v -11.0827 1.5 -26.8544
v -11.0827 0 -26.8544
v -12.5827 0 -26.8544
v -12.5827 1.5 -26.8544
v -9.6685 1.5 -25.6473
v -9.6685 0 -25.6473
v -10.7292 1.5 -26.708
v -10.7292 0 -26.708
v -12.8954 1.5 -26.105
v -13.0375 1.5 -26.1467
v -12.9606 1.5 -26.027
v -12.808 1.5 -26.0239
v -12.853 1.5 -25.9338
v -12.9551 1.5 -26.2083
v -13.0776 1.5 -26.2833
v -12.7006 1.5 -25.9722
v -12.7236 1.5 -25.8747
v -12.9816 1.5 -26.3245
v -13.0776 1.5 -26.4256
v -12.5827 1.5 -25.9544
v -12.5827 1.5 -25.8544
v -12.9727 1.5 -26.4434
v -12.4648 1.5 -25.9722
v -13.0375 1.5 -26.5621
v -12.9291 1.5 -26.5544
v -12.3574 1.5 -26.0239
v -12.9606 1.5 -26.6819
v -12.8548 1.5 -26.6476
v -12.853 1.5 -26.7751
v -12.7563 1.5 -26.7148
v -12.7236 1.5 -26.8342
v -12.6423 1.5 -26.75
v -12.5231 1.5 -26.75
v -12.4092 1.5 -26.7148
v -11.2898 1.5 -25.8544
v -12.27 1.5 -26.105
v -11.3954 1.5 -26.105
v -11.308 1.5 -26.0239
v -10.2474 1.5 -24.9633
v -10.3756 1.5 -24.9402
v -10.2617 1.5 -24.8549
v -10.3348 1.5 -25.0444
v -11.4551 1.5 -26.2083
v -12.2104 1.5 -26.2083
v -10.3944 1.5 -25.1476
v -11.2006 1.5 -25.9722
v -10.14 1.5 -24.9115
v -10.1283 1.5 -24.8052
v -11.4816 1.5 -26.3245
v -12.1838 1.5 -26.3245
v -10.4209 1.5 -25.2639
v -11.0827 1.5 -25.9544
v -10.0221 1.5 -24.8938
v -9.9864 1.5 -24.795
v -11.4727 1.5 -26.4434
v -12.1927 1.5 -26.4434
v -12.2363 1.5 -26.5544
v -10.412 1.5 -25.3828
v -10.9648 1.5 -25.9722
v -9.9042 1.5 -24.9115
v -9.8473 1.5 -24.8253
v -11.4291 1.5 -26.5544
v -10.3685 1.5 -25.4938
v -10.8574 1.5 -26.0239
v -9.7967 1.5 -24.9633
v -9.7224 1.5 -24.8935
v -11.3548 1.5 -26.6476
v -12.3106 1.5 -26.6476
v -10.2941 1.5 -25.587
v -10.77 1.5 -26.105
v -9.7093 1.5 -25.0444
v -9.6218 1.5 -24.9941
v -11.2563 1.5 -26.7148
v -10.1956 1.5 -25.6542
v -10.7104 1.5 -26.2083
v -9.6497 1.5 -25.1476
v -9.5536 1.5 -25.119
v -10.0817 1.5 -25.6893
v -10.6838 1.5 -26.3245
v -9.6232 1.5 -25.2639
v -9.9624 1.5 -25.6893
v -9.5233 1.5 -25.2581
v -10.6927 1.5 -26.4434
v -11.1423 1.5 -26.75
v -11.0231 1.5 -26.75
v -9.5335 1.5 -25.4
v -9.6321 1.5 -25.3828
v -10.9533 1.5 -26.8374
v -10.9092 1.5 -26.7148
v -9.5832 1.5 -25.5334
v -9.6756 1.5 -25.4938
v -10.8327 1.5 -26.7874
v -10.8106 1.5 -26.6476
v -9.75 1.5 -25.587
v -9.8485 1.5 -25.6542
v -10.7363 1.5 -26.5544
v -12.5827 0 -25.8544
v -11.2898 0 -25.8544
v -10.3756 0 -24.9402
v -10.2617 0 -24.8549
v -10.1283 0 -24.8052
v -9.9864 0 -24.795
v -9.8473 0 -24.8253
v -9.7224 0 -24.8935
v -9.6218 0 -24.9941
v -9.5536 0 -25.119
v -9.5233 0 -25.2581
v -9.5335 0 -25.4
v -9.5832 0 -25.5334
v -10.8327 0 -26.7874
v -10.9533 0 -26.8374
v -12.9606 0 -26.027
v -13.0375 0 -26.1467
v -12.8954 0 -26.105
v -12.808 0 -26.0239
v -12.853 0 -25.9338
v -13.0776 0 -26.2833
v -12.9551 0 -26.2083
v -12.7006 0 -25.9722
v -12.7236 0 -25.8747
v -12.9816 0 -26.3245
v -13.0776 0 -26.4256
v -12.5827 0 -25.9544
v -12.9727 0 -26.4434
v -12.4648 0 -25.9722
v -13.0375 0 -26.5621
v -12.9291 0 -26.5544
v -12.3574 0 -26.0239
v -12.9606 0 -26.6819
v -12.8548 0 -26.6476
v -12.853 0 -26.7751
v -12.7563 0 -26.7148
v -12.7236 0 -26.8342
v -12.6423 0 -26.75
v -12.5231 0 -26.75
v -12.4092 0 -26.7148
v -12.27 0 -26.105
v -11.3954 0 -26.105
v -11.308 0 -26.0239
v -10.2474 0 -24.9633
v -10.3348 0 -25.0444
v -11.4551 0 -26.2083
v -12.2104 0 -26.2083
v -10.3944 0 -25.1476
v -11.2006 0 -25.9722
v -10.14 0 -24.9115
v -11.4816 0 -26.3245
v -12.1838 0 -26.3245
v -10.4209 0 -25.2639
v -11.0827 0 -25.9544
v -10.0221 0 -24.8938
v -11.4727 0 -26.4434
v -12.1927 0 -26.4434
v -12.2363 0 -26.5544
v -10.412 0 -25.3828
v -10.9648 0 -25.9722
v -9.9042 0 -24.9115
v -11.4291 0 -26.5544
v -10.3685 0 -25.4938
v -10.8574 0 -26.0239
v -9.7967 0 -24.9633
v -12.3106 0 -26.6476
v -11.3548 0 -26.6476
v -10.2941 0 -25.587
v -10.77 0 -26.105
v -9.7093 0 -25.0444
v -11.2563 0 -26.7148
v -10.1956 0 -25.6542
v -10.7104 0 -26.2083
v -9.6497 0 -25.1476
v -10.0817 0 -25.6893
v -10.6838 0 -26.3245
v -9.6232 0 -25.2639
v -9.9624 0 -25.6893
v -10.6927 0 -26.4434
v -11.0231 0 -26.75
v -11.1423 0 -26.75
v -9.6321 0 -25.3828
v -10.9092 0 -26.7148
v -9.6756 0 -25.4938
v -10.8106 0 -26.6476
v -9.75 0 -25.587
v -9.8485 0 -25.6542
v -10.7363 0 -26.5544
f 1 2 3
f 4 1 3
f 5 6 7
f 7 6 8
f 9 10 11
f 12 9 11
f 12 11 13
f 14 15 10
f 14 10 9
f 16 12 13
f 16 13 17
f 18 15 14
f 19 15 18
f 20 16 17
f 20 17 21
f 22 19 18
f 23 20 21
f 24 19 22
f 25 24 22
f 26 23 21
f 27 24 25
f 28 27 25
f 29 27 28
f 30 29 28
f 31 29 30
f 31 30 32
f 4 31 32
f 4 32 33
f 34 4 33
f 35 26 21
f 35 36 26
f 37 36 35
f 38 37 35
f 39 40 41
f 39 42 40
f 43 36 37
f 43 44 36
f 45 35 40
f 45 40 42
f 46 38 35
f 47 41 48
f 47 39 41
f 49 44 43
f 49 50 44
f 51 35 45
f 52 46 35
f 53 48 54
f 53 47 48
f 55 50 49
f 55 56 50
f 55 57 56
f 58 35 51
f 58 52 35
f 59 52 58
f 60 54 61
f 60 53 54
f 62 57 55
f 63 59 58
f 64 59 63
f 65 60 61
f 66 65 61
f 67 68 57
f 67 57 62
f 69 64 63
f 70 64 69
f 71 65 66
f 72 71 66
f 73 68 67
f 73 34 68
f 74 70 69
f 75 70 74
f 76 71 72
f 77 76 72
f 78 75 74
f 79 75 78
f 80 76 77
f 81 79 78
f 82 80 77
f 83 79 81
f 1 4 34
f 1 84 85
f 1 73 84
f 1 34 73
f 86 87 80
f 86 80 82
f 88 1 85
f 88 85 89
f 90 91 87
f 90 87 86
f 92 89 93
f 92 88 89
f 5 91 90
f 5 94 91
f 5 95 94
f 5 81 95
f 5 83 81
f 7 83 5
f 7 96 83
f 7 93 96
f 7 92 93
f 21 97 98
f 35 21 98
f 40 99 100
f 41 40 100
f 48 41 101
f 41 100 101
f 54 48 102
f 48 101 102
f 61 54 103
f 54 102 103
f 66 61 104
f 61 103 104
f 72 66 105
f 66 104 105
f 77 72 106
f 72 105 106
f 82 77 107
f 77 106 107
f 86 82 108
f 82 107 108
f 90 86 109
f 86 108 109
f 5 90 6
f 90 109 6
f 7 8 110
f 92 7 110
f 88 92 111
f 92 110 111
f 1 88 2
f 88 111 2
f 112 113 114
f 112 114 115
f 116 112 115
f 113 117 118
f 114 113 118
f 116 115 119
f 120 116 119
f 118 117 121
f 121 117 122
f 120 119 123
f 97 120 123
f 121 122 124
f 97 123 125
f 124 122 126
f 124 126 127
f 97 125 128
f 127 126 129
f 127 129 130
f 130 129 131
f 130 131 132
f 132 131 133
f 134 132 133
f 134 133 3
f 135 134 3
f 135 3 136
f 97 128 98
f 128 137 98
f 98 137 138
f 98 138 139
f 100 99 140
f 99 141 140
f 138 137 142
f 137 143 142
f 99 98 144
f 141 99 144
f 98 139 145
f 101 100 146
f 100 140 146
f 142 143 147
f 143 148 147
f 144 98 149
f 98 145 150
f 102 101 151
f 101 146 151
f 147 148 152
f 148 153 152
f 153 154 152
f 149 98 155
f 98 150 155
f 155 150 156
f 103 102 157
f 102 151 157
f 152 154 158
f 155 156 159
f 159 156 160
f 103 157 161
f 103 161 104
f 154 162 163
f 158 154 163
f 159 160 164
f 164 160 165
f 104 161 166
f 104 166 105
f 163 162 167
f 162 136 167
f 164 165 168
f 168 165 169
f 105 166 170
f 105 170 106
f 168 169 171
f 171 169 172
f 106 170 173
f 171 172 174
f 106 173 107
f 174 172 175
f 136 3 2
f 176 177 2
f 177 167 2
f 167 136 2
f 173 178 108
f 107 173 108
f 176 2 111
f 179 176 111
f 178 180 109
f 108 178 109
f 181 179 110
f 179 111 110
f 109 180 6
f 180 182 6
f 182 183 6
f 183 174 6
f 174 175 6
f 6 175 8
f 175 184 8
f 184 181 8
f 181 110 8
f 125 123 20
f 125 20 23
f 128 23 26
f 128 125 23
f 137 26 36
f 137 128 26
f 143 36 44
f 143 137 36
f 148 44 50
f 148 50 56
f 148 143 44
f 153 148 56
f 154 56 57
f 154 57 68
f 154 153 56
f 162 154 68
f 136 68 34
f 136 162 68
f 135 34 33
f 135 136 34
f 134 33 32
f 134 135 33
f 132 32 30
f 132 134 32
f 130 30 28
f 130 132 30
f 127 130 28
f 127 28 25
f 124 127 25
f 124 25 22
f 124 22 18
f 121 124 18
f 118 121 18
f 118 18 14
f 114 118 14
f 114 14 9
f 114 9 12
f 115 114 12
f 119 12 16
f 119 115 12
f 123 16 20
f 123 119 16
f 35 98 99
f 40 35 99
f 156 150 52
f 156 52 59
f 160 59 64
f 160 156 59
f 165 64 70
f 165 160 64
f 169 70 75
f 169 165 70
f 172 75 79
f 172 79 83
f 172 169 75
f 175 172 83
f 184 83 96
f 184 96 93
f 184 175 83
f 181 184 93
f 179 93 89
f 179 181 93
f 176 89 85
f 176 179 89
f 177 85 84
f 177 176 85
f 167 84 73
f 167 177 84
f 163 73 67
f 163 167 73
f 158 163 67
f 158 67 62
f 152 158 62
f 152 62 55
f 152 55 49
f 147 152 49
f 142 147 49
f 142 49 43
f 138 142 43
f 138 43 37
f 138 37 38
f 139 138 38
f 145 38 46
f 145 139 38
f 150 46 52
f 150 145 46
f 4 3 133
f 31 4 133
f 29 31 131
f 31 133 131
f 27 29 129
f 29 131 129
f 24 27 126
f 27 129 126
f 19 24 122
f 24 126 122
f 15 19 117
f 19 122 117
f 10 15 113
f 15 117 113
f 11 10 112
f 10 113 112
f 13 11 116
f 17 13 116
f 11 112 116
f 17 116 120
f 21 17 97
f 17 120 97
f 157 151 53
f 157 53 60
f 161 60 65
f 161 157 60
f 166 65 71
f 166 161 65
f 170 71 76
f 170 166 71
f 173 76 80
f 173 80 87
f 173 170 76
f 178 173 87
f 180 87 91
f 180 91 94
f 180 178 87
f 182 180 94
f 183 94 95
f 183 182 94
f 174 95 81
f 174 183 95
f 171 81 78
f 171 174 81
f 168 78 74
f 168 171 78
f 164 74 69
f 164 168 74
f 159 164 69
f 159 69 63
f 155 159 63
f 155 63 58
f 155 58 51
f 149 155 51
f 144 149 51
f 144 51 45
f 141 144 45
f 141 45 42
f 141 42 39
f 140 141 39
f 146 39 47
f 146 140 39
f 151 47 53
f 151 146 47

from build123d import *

# Parameters (mm, degrees)
SKETCH1_R           = 0.4
BOSS_EXTRUDE1_DEPTH = 1.5


with BuildPart() as part:
    # Sketch1 → Boss-Extrude1 (new body)
    # profile 1 of 3: a face of its own
    with BuildSketch(Plane(origin=(0, 0, 0), x_dir=(1, 0, 0), z_dir=(0, 1, 0))):
        with BuildLine():
            ThreePointArc((-10.729159454, 26.707979083), (-10.891371129, 26.816365459), (-11.082712845, 26.854425692))
            ThreePointArc((-11.082712845, 26.854425692), (-11.544652611, 26.545767409), (-11.436266235, 26.000872302))
            Line((-11.436266235, 26.000872302), (-11.289819626, 25.854425692))
            Line((-11.289819626, 25.854425692), (-11.082712845, 25.854425692))
            ThreePointArc((-11.082712845, 25.854425692), (-10.620773079, 26.163083976), (-10.729159454, 26.707979083))
        make_face()
        with Locations(Location((-11.082712845, 26.354425692, 0), (0, 0, 270))):
            Circle(SKETCH1_R, mode=Mode.SUBTRACT)
    # profile 2 of 3: a face of its own
    with BuildSketch(Plane(origin=(0, 0, 0), x_dir=(1, 0, 0), z_dir=(0, 1, 0))):
        with BuildLine():
            Line((-11.082712845, 26.854425692), (-12.582712845, 26.854425692))
            ThreePointArc((-12.582712845, 26.854425692), (-13.082712845, 26.354425692), (-12.582712845, 25.854425692))
            Line((-12.582712845, 25.854425692), (-11.289819626, 25.854425692))
            Line((-11.289819626, 25.854425692), (-11.436266235, 26.000872302))
            ThreePointArc((-11.436266235, 26.000872302), (-11.544652611, 26.545767409), (-11.082712845, 26.854425692))
        make_face()
        with Locations(Location((-12.582712845, 26.354425692, 0), (0, 0, 270))):
            Circle(SKETCH1_R, mode=Mode.SUBTRACT)
    # profile 3 of 3: a face of its own
    with BuildSketch(Plane(origin=(0, 0, 0), x_dir=(1, 0, 0), z_dir=(0, 1, 0))):
        with BuildLine():
            Line((-9.668499282, 25.647318911), (-10.729159454, 26.707979083))
            ThreePointArc((-10.729159454, 26.707979083), (-10.620773079, 26.163083976), (-11.082712845, 25.854425692))
            Line((-11.082712845, 25.854425692), (-11.289819626, 25.854425692))
            Line((-11.289819626, 25.854425692), (-10.375606064, 24.94021213))
            ThreePointArc((-10.375606064, 24.94021213), (-9.668499282, 24.94021213), (-9.668499282, 25.647318911))
        make_face()
        with Locations(Location((-10.022052673, 25.293765521, 0), (0, 0, 270))):
            Circle(SKETCH1_R, mode=Mode.SUBTRACT)
    extrude(amount=BOSS_EXTRUDE1_DEPTH)


solid = part.part
